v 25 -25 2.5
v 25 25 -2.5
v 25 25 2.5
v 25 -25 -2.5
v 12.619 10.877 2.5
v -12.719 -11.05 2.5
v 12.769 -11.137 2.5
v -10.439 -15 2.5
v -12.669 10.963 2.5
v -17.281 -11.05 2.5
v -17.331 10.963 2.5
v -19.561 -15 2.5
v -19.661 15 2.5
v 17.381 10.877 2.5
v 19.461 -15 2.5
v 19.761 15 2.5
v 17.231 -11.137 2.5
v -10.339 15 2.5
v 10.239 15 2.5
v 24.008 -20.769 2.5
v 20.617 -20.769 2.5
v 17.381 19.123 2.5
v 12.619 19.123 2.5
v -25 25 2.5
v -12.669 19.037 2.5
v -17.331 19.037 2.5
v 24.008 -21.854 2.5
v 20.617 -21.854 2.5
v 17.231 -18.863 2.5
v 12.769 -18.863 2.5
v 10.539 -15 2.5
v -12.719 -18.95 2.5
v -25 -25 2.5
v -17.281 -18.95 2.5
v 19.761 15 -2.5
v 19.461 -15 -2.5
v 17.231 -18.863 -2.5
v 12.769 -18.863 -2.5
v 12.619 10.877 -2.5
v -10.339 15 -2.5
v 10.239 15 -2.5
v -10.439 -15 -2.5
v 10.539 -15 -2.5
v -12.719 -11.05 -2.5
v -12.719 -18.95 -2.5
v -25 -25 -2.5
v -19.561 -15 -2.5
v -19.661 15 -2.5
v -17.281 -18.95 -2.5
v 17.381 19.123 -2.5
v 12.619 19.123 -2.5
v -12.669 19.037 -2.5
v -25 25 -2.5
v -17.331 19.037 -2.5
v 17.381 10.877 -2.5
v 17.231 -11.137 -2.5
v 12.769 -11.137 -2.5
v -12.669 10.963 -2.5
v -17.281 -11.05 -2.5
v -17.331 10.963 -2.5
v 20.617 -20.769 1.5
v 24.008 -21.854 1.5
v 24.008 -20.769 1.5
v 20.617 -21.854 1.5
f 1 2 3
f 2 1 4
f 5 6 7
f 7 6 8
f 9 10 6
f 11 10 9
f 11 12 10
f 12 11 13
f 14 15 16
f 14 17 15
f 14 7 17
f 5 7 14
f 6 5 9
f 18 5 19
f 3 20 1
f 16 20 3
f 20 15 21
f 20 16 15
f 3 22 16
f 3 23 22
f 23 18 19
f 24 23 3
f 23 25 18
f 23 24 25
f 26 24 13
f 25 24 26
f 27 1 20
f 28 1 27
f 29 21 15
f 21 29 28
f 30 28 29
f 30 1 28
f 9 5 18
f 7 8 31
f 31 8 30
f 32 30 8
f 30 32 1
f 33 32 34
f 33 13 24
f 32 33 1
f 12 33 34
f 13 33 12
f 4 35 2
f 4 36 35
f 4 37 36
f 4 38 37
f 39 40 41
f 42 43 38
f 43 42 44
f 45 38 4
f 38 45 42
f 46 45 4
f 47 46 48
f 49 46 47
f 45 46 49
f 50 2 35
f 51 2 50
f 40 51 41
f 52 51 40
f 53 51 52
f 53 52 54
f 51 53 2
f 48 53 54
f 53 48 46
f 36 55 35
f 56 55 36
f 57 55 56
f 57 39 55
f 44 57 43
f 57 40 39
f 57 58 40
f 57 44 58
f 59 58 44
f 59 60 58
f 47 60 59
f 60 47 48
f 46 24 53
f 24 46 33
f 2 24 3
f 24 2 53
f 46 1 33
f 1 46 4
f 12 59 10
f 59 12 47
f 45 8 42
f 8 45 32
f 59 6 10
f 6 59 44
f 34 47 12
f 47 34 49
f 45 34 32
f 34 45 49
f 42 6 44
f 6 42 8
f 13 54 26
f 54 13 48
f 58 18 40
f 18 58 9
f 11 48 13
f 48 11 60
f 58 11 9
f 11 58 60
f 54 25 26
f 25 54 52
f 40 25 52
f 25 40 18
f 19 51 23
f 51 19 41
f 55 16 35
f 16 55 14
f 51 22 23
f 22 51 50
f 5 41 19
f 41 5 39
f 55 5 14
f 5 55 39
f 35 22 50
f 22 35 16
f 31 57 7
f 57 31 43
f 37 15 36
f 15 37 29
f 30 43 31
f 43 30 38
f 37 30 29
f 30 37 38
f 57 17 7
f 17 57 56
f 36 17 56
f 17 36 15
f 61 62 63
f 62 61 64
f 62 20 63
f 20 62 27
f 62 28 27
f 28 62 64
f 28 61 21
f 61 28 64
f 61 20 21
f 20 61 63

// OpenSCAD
sizeTest = true;

module hexagon(r) {
    translate([0, 0, -5])
    linear_extrude(10)
    polygon([for (i = [0 : 6]) r * [cos(i * 60), sin(i * 60)]]);
}

r = 7.9 / (2 * cos(30));

if (sizeTest) {
    difference () {
        cube([50, 50, 5], true);
        
        translate([-15, -15, 0])
        hexagon(r);

        translate([-15,  15, 0])
        hexagon(r + 0.1);

        translate([ 15,  15, 0])
        hexagon(r + 0.2);

        translate([ 15, -15, 0])
        hexagon(r - 0.1);
        
        translate([20, -25, 1.5])
        linear_extrude(2)
        text("-");
    }
} else {
    difference() {
        scale(10/14)
        import("corejo/helice-toroidale/helice_18.stl");
        
        // Das Loch muss nicht ganz durchgehen; daher sollten 5mm ausreichen
        hexagon(r + 0.2);
    }
}
